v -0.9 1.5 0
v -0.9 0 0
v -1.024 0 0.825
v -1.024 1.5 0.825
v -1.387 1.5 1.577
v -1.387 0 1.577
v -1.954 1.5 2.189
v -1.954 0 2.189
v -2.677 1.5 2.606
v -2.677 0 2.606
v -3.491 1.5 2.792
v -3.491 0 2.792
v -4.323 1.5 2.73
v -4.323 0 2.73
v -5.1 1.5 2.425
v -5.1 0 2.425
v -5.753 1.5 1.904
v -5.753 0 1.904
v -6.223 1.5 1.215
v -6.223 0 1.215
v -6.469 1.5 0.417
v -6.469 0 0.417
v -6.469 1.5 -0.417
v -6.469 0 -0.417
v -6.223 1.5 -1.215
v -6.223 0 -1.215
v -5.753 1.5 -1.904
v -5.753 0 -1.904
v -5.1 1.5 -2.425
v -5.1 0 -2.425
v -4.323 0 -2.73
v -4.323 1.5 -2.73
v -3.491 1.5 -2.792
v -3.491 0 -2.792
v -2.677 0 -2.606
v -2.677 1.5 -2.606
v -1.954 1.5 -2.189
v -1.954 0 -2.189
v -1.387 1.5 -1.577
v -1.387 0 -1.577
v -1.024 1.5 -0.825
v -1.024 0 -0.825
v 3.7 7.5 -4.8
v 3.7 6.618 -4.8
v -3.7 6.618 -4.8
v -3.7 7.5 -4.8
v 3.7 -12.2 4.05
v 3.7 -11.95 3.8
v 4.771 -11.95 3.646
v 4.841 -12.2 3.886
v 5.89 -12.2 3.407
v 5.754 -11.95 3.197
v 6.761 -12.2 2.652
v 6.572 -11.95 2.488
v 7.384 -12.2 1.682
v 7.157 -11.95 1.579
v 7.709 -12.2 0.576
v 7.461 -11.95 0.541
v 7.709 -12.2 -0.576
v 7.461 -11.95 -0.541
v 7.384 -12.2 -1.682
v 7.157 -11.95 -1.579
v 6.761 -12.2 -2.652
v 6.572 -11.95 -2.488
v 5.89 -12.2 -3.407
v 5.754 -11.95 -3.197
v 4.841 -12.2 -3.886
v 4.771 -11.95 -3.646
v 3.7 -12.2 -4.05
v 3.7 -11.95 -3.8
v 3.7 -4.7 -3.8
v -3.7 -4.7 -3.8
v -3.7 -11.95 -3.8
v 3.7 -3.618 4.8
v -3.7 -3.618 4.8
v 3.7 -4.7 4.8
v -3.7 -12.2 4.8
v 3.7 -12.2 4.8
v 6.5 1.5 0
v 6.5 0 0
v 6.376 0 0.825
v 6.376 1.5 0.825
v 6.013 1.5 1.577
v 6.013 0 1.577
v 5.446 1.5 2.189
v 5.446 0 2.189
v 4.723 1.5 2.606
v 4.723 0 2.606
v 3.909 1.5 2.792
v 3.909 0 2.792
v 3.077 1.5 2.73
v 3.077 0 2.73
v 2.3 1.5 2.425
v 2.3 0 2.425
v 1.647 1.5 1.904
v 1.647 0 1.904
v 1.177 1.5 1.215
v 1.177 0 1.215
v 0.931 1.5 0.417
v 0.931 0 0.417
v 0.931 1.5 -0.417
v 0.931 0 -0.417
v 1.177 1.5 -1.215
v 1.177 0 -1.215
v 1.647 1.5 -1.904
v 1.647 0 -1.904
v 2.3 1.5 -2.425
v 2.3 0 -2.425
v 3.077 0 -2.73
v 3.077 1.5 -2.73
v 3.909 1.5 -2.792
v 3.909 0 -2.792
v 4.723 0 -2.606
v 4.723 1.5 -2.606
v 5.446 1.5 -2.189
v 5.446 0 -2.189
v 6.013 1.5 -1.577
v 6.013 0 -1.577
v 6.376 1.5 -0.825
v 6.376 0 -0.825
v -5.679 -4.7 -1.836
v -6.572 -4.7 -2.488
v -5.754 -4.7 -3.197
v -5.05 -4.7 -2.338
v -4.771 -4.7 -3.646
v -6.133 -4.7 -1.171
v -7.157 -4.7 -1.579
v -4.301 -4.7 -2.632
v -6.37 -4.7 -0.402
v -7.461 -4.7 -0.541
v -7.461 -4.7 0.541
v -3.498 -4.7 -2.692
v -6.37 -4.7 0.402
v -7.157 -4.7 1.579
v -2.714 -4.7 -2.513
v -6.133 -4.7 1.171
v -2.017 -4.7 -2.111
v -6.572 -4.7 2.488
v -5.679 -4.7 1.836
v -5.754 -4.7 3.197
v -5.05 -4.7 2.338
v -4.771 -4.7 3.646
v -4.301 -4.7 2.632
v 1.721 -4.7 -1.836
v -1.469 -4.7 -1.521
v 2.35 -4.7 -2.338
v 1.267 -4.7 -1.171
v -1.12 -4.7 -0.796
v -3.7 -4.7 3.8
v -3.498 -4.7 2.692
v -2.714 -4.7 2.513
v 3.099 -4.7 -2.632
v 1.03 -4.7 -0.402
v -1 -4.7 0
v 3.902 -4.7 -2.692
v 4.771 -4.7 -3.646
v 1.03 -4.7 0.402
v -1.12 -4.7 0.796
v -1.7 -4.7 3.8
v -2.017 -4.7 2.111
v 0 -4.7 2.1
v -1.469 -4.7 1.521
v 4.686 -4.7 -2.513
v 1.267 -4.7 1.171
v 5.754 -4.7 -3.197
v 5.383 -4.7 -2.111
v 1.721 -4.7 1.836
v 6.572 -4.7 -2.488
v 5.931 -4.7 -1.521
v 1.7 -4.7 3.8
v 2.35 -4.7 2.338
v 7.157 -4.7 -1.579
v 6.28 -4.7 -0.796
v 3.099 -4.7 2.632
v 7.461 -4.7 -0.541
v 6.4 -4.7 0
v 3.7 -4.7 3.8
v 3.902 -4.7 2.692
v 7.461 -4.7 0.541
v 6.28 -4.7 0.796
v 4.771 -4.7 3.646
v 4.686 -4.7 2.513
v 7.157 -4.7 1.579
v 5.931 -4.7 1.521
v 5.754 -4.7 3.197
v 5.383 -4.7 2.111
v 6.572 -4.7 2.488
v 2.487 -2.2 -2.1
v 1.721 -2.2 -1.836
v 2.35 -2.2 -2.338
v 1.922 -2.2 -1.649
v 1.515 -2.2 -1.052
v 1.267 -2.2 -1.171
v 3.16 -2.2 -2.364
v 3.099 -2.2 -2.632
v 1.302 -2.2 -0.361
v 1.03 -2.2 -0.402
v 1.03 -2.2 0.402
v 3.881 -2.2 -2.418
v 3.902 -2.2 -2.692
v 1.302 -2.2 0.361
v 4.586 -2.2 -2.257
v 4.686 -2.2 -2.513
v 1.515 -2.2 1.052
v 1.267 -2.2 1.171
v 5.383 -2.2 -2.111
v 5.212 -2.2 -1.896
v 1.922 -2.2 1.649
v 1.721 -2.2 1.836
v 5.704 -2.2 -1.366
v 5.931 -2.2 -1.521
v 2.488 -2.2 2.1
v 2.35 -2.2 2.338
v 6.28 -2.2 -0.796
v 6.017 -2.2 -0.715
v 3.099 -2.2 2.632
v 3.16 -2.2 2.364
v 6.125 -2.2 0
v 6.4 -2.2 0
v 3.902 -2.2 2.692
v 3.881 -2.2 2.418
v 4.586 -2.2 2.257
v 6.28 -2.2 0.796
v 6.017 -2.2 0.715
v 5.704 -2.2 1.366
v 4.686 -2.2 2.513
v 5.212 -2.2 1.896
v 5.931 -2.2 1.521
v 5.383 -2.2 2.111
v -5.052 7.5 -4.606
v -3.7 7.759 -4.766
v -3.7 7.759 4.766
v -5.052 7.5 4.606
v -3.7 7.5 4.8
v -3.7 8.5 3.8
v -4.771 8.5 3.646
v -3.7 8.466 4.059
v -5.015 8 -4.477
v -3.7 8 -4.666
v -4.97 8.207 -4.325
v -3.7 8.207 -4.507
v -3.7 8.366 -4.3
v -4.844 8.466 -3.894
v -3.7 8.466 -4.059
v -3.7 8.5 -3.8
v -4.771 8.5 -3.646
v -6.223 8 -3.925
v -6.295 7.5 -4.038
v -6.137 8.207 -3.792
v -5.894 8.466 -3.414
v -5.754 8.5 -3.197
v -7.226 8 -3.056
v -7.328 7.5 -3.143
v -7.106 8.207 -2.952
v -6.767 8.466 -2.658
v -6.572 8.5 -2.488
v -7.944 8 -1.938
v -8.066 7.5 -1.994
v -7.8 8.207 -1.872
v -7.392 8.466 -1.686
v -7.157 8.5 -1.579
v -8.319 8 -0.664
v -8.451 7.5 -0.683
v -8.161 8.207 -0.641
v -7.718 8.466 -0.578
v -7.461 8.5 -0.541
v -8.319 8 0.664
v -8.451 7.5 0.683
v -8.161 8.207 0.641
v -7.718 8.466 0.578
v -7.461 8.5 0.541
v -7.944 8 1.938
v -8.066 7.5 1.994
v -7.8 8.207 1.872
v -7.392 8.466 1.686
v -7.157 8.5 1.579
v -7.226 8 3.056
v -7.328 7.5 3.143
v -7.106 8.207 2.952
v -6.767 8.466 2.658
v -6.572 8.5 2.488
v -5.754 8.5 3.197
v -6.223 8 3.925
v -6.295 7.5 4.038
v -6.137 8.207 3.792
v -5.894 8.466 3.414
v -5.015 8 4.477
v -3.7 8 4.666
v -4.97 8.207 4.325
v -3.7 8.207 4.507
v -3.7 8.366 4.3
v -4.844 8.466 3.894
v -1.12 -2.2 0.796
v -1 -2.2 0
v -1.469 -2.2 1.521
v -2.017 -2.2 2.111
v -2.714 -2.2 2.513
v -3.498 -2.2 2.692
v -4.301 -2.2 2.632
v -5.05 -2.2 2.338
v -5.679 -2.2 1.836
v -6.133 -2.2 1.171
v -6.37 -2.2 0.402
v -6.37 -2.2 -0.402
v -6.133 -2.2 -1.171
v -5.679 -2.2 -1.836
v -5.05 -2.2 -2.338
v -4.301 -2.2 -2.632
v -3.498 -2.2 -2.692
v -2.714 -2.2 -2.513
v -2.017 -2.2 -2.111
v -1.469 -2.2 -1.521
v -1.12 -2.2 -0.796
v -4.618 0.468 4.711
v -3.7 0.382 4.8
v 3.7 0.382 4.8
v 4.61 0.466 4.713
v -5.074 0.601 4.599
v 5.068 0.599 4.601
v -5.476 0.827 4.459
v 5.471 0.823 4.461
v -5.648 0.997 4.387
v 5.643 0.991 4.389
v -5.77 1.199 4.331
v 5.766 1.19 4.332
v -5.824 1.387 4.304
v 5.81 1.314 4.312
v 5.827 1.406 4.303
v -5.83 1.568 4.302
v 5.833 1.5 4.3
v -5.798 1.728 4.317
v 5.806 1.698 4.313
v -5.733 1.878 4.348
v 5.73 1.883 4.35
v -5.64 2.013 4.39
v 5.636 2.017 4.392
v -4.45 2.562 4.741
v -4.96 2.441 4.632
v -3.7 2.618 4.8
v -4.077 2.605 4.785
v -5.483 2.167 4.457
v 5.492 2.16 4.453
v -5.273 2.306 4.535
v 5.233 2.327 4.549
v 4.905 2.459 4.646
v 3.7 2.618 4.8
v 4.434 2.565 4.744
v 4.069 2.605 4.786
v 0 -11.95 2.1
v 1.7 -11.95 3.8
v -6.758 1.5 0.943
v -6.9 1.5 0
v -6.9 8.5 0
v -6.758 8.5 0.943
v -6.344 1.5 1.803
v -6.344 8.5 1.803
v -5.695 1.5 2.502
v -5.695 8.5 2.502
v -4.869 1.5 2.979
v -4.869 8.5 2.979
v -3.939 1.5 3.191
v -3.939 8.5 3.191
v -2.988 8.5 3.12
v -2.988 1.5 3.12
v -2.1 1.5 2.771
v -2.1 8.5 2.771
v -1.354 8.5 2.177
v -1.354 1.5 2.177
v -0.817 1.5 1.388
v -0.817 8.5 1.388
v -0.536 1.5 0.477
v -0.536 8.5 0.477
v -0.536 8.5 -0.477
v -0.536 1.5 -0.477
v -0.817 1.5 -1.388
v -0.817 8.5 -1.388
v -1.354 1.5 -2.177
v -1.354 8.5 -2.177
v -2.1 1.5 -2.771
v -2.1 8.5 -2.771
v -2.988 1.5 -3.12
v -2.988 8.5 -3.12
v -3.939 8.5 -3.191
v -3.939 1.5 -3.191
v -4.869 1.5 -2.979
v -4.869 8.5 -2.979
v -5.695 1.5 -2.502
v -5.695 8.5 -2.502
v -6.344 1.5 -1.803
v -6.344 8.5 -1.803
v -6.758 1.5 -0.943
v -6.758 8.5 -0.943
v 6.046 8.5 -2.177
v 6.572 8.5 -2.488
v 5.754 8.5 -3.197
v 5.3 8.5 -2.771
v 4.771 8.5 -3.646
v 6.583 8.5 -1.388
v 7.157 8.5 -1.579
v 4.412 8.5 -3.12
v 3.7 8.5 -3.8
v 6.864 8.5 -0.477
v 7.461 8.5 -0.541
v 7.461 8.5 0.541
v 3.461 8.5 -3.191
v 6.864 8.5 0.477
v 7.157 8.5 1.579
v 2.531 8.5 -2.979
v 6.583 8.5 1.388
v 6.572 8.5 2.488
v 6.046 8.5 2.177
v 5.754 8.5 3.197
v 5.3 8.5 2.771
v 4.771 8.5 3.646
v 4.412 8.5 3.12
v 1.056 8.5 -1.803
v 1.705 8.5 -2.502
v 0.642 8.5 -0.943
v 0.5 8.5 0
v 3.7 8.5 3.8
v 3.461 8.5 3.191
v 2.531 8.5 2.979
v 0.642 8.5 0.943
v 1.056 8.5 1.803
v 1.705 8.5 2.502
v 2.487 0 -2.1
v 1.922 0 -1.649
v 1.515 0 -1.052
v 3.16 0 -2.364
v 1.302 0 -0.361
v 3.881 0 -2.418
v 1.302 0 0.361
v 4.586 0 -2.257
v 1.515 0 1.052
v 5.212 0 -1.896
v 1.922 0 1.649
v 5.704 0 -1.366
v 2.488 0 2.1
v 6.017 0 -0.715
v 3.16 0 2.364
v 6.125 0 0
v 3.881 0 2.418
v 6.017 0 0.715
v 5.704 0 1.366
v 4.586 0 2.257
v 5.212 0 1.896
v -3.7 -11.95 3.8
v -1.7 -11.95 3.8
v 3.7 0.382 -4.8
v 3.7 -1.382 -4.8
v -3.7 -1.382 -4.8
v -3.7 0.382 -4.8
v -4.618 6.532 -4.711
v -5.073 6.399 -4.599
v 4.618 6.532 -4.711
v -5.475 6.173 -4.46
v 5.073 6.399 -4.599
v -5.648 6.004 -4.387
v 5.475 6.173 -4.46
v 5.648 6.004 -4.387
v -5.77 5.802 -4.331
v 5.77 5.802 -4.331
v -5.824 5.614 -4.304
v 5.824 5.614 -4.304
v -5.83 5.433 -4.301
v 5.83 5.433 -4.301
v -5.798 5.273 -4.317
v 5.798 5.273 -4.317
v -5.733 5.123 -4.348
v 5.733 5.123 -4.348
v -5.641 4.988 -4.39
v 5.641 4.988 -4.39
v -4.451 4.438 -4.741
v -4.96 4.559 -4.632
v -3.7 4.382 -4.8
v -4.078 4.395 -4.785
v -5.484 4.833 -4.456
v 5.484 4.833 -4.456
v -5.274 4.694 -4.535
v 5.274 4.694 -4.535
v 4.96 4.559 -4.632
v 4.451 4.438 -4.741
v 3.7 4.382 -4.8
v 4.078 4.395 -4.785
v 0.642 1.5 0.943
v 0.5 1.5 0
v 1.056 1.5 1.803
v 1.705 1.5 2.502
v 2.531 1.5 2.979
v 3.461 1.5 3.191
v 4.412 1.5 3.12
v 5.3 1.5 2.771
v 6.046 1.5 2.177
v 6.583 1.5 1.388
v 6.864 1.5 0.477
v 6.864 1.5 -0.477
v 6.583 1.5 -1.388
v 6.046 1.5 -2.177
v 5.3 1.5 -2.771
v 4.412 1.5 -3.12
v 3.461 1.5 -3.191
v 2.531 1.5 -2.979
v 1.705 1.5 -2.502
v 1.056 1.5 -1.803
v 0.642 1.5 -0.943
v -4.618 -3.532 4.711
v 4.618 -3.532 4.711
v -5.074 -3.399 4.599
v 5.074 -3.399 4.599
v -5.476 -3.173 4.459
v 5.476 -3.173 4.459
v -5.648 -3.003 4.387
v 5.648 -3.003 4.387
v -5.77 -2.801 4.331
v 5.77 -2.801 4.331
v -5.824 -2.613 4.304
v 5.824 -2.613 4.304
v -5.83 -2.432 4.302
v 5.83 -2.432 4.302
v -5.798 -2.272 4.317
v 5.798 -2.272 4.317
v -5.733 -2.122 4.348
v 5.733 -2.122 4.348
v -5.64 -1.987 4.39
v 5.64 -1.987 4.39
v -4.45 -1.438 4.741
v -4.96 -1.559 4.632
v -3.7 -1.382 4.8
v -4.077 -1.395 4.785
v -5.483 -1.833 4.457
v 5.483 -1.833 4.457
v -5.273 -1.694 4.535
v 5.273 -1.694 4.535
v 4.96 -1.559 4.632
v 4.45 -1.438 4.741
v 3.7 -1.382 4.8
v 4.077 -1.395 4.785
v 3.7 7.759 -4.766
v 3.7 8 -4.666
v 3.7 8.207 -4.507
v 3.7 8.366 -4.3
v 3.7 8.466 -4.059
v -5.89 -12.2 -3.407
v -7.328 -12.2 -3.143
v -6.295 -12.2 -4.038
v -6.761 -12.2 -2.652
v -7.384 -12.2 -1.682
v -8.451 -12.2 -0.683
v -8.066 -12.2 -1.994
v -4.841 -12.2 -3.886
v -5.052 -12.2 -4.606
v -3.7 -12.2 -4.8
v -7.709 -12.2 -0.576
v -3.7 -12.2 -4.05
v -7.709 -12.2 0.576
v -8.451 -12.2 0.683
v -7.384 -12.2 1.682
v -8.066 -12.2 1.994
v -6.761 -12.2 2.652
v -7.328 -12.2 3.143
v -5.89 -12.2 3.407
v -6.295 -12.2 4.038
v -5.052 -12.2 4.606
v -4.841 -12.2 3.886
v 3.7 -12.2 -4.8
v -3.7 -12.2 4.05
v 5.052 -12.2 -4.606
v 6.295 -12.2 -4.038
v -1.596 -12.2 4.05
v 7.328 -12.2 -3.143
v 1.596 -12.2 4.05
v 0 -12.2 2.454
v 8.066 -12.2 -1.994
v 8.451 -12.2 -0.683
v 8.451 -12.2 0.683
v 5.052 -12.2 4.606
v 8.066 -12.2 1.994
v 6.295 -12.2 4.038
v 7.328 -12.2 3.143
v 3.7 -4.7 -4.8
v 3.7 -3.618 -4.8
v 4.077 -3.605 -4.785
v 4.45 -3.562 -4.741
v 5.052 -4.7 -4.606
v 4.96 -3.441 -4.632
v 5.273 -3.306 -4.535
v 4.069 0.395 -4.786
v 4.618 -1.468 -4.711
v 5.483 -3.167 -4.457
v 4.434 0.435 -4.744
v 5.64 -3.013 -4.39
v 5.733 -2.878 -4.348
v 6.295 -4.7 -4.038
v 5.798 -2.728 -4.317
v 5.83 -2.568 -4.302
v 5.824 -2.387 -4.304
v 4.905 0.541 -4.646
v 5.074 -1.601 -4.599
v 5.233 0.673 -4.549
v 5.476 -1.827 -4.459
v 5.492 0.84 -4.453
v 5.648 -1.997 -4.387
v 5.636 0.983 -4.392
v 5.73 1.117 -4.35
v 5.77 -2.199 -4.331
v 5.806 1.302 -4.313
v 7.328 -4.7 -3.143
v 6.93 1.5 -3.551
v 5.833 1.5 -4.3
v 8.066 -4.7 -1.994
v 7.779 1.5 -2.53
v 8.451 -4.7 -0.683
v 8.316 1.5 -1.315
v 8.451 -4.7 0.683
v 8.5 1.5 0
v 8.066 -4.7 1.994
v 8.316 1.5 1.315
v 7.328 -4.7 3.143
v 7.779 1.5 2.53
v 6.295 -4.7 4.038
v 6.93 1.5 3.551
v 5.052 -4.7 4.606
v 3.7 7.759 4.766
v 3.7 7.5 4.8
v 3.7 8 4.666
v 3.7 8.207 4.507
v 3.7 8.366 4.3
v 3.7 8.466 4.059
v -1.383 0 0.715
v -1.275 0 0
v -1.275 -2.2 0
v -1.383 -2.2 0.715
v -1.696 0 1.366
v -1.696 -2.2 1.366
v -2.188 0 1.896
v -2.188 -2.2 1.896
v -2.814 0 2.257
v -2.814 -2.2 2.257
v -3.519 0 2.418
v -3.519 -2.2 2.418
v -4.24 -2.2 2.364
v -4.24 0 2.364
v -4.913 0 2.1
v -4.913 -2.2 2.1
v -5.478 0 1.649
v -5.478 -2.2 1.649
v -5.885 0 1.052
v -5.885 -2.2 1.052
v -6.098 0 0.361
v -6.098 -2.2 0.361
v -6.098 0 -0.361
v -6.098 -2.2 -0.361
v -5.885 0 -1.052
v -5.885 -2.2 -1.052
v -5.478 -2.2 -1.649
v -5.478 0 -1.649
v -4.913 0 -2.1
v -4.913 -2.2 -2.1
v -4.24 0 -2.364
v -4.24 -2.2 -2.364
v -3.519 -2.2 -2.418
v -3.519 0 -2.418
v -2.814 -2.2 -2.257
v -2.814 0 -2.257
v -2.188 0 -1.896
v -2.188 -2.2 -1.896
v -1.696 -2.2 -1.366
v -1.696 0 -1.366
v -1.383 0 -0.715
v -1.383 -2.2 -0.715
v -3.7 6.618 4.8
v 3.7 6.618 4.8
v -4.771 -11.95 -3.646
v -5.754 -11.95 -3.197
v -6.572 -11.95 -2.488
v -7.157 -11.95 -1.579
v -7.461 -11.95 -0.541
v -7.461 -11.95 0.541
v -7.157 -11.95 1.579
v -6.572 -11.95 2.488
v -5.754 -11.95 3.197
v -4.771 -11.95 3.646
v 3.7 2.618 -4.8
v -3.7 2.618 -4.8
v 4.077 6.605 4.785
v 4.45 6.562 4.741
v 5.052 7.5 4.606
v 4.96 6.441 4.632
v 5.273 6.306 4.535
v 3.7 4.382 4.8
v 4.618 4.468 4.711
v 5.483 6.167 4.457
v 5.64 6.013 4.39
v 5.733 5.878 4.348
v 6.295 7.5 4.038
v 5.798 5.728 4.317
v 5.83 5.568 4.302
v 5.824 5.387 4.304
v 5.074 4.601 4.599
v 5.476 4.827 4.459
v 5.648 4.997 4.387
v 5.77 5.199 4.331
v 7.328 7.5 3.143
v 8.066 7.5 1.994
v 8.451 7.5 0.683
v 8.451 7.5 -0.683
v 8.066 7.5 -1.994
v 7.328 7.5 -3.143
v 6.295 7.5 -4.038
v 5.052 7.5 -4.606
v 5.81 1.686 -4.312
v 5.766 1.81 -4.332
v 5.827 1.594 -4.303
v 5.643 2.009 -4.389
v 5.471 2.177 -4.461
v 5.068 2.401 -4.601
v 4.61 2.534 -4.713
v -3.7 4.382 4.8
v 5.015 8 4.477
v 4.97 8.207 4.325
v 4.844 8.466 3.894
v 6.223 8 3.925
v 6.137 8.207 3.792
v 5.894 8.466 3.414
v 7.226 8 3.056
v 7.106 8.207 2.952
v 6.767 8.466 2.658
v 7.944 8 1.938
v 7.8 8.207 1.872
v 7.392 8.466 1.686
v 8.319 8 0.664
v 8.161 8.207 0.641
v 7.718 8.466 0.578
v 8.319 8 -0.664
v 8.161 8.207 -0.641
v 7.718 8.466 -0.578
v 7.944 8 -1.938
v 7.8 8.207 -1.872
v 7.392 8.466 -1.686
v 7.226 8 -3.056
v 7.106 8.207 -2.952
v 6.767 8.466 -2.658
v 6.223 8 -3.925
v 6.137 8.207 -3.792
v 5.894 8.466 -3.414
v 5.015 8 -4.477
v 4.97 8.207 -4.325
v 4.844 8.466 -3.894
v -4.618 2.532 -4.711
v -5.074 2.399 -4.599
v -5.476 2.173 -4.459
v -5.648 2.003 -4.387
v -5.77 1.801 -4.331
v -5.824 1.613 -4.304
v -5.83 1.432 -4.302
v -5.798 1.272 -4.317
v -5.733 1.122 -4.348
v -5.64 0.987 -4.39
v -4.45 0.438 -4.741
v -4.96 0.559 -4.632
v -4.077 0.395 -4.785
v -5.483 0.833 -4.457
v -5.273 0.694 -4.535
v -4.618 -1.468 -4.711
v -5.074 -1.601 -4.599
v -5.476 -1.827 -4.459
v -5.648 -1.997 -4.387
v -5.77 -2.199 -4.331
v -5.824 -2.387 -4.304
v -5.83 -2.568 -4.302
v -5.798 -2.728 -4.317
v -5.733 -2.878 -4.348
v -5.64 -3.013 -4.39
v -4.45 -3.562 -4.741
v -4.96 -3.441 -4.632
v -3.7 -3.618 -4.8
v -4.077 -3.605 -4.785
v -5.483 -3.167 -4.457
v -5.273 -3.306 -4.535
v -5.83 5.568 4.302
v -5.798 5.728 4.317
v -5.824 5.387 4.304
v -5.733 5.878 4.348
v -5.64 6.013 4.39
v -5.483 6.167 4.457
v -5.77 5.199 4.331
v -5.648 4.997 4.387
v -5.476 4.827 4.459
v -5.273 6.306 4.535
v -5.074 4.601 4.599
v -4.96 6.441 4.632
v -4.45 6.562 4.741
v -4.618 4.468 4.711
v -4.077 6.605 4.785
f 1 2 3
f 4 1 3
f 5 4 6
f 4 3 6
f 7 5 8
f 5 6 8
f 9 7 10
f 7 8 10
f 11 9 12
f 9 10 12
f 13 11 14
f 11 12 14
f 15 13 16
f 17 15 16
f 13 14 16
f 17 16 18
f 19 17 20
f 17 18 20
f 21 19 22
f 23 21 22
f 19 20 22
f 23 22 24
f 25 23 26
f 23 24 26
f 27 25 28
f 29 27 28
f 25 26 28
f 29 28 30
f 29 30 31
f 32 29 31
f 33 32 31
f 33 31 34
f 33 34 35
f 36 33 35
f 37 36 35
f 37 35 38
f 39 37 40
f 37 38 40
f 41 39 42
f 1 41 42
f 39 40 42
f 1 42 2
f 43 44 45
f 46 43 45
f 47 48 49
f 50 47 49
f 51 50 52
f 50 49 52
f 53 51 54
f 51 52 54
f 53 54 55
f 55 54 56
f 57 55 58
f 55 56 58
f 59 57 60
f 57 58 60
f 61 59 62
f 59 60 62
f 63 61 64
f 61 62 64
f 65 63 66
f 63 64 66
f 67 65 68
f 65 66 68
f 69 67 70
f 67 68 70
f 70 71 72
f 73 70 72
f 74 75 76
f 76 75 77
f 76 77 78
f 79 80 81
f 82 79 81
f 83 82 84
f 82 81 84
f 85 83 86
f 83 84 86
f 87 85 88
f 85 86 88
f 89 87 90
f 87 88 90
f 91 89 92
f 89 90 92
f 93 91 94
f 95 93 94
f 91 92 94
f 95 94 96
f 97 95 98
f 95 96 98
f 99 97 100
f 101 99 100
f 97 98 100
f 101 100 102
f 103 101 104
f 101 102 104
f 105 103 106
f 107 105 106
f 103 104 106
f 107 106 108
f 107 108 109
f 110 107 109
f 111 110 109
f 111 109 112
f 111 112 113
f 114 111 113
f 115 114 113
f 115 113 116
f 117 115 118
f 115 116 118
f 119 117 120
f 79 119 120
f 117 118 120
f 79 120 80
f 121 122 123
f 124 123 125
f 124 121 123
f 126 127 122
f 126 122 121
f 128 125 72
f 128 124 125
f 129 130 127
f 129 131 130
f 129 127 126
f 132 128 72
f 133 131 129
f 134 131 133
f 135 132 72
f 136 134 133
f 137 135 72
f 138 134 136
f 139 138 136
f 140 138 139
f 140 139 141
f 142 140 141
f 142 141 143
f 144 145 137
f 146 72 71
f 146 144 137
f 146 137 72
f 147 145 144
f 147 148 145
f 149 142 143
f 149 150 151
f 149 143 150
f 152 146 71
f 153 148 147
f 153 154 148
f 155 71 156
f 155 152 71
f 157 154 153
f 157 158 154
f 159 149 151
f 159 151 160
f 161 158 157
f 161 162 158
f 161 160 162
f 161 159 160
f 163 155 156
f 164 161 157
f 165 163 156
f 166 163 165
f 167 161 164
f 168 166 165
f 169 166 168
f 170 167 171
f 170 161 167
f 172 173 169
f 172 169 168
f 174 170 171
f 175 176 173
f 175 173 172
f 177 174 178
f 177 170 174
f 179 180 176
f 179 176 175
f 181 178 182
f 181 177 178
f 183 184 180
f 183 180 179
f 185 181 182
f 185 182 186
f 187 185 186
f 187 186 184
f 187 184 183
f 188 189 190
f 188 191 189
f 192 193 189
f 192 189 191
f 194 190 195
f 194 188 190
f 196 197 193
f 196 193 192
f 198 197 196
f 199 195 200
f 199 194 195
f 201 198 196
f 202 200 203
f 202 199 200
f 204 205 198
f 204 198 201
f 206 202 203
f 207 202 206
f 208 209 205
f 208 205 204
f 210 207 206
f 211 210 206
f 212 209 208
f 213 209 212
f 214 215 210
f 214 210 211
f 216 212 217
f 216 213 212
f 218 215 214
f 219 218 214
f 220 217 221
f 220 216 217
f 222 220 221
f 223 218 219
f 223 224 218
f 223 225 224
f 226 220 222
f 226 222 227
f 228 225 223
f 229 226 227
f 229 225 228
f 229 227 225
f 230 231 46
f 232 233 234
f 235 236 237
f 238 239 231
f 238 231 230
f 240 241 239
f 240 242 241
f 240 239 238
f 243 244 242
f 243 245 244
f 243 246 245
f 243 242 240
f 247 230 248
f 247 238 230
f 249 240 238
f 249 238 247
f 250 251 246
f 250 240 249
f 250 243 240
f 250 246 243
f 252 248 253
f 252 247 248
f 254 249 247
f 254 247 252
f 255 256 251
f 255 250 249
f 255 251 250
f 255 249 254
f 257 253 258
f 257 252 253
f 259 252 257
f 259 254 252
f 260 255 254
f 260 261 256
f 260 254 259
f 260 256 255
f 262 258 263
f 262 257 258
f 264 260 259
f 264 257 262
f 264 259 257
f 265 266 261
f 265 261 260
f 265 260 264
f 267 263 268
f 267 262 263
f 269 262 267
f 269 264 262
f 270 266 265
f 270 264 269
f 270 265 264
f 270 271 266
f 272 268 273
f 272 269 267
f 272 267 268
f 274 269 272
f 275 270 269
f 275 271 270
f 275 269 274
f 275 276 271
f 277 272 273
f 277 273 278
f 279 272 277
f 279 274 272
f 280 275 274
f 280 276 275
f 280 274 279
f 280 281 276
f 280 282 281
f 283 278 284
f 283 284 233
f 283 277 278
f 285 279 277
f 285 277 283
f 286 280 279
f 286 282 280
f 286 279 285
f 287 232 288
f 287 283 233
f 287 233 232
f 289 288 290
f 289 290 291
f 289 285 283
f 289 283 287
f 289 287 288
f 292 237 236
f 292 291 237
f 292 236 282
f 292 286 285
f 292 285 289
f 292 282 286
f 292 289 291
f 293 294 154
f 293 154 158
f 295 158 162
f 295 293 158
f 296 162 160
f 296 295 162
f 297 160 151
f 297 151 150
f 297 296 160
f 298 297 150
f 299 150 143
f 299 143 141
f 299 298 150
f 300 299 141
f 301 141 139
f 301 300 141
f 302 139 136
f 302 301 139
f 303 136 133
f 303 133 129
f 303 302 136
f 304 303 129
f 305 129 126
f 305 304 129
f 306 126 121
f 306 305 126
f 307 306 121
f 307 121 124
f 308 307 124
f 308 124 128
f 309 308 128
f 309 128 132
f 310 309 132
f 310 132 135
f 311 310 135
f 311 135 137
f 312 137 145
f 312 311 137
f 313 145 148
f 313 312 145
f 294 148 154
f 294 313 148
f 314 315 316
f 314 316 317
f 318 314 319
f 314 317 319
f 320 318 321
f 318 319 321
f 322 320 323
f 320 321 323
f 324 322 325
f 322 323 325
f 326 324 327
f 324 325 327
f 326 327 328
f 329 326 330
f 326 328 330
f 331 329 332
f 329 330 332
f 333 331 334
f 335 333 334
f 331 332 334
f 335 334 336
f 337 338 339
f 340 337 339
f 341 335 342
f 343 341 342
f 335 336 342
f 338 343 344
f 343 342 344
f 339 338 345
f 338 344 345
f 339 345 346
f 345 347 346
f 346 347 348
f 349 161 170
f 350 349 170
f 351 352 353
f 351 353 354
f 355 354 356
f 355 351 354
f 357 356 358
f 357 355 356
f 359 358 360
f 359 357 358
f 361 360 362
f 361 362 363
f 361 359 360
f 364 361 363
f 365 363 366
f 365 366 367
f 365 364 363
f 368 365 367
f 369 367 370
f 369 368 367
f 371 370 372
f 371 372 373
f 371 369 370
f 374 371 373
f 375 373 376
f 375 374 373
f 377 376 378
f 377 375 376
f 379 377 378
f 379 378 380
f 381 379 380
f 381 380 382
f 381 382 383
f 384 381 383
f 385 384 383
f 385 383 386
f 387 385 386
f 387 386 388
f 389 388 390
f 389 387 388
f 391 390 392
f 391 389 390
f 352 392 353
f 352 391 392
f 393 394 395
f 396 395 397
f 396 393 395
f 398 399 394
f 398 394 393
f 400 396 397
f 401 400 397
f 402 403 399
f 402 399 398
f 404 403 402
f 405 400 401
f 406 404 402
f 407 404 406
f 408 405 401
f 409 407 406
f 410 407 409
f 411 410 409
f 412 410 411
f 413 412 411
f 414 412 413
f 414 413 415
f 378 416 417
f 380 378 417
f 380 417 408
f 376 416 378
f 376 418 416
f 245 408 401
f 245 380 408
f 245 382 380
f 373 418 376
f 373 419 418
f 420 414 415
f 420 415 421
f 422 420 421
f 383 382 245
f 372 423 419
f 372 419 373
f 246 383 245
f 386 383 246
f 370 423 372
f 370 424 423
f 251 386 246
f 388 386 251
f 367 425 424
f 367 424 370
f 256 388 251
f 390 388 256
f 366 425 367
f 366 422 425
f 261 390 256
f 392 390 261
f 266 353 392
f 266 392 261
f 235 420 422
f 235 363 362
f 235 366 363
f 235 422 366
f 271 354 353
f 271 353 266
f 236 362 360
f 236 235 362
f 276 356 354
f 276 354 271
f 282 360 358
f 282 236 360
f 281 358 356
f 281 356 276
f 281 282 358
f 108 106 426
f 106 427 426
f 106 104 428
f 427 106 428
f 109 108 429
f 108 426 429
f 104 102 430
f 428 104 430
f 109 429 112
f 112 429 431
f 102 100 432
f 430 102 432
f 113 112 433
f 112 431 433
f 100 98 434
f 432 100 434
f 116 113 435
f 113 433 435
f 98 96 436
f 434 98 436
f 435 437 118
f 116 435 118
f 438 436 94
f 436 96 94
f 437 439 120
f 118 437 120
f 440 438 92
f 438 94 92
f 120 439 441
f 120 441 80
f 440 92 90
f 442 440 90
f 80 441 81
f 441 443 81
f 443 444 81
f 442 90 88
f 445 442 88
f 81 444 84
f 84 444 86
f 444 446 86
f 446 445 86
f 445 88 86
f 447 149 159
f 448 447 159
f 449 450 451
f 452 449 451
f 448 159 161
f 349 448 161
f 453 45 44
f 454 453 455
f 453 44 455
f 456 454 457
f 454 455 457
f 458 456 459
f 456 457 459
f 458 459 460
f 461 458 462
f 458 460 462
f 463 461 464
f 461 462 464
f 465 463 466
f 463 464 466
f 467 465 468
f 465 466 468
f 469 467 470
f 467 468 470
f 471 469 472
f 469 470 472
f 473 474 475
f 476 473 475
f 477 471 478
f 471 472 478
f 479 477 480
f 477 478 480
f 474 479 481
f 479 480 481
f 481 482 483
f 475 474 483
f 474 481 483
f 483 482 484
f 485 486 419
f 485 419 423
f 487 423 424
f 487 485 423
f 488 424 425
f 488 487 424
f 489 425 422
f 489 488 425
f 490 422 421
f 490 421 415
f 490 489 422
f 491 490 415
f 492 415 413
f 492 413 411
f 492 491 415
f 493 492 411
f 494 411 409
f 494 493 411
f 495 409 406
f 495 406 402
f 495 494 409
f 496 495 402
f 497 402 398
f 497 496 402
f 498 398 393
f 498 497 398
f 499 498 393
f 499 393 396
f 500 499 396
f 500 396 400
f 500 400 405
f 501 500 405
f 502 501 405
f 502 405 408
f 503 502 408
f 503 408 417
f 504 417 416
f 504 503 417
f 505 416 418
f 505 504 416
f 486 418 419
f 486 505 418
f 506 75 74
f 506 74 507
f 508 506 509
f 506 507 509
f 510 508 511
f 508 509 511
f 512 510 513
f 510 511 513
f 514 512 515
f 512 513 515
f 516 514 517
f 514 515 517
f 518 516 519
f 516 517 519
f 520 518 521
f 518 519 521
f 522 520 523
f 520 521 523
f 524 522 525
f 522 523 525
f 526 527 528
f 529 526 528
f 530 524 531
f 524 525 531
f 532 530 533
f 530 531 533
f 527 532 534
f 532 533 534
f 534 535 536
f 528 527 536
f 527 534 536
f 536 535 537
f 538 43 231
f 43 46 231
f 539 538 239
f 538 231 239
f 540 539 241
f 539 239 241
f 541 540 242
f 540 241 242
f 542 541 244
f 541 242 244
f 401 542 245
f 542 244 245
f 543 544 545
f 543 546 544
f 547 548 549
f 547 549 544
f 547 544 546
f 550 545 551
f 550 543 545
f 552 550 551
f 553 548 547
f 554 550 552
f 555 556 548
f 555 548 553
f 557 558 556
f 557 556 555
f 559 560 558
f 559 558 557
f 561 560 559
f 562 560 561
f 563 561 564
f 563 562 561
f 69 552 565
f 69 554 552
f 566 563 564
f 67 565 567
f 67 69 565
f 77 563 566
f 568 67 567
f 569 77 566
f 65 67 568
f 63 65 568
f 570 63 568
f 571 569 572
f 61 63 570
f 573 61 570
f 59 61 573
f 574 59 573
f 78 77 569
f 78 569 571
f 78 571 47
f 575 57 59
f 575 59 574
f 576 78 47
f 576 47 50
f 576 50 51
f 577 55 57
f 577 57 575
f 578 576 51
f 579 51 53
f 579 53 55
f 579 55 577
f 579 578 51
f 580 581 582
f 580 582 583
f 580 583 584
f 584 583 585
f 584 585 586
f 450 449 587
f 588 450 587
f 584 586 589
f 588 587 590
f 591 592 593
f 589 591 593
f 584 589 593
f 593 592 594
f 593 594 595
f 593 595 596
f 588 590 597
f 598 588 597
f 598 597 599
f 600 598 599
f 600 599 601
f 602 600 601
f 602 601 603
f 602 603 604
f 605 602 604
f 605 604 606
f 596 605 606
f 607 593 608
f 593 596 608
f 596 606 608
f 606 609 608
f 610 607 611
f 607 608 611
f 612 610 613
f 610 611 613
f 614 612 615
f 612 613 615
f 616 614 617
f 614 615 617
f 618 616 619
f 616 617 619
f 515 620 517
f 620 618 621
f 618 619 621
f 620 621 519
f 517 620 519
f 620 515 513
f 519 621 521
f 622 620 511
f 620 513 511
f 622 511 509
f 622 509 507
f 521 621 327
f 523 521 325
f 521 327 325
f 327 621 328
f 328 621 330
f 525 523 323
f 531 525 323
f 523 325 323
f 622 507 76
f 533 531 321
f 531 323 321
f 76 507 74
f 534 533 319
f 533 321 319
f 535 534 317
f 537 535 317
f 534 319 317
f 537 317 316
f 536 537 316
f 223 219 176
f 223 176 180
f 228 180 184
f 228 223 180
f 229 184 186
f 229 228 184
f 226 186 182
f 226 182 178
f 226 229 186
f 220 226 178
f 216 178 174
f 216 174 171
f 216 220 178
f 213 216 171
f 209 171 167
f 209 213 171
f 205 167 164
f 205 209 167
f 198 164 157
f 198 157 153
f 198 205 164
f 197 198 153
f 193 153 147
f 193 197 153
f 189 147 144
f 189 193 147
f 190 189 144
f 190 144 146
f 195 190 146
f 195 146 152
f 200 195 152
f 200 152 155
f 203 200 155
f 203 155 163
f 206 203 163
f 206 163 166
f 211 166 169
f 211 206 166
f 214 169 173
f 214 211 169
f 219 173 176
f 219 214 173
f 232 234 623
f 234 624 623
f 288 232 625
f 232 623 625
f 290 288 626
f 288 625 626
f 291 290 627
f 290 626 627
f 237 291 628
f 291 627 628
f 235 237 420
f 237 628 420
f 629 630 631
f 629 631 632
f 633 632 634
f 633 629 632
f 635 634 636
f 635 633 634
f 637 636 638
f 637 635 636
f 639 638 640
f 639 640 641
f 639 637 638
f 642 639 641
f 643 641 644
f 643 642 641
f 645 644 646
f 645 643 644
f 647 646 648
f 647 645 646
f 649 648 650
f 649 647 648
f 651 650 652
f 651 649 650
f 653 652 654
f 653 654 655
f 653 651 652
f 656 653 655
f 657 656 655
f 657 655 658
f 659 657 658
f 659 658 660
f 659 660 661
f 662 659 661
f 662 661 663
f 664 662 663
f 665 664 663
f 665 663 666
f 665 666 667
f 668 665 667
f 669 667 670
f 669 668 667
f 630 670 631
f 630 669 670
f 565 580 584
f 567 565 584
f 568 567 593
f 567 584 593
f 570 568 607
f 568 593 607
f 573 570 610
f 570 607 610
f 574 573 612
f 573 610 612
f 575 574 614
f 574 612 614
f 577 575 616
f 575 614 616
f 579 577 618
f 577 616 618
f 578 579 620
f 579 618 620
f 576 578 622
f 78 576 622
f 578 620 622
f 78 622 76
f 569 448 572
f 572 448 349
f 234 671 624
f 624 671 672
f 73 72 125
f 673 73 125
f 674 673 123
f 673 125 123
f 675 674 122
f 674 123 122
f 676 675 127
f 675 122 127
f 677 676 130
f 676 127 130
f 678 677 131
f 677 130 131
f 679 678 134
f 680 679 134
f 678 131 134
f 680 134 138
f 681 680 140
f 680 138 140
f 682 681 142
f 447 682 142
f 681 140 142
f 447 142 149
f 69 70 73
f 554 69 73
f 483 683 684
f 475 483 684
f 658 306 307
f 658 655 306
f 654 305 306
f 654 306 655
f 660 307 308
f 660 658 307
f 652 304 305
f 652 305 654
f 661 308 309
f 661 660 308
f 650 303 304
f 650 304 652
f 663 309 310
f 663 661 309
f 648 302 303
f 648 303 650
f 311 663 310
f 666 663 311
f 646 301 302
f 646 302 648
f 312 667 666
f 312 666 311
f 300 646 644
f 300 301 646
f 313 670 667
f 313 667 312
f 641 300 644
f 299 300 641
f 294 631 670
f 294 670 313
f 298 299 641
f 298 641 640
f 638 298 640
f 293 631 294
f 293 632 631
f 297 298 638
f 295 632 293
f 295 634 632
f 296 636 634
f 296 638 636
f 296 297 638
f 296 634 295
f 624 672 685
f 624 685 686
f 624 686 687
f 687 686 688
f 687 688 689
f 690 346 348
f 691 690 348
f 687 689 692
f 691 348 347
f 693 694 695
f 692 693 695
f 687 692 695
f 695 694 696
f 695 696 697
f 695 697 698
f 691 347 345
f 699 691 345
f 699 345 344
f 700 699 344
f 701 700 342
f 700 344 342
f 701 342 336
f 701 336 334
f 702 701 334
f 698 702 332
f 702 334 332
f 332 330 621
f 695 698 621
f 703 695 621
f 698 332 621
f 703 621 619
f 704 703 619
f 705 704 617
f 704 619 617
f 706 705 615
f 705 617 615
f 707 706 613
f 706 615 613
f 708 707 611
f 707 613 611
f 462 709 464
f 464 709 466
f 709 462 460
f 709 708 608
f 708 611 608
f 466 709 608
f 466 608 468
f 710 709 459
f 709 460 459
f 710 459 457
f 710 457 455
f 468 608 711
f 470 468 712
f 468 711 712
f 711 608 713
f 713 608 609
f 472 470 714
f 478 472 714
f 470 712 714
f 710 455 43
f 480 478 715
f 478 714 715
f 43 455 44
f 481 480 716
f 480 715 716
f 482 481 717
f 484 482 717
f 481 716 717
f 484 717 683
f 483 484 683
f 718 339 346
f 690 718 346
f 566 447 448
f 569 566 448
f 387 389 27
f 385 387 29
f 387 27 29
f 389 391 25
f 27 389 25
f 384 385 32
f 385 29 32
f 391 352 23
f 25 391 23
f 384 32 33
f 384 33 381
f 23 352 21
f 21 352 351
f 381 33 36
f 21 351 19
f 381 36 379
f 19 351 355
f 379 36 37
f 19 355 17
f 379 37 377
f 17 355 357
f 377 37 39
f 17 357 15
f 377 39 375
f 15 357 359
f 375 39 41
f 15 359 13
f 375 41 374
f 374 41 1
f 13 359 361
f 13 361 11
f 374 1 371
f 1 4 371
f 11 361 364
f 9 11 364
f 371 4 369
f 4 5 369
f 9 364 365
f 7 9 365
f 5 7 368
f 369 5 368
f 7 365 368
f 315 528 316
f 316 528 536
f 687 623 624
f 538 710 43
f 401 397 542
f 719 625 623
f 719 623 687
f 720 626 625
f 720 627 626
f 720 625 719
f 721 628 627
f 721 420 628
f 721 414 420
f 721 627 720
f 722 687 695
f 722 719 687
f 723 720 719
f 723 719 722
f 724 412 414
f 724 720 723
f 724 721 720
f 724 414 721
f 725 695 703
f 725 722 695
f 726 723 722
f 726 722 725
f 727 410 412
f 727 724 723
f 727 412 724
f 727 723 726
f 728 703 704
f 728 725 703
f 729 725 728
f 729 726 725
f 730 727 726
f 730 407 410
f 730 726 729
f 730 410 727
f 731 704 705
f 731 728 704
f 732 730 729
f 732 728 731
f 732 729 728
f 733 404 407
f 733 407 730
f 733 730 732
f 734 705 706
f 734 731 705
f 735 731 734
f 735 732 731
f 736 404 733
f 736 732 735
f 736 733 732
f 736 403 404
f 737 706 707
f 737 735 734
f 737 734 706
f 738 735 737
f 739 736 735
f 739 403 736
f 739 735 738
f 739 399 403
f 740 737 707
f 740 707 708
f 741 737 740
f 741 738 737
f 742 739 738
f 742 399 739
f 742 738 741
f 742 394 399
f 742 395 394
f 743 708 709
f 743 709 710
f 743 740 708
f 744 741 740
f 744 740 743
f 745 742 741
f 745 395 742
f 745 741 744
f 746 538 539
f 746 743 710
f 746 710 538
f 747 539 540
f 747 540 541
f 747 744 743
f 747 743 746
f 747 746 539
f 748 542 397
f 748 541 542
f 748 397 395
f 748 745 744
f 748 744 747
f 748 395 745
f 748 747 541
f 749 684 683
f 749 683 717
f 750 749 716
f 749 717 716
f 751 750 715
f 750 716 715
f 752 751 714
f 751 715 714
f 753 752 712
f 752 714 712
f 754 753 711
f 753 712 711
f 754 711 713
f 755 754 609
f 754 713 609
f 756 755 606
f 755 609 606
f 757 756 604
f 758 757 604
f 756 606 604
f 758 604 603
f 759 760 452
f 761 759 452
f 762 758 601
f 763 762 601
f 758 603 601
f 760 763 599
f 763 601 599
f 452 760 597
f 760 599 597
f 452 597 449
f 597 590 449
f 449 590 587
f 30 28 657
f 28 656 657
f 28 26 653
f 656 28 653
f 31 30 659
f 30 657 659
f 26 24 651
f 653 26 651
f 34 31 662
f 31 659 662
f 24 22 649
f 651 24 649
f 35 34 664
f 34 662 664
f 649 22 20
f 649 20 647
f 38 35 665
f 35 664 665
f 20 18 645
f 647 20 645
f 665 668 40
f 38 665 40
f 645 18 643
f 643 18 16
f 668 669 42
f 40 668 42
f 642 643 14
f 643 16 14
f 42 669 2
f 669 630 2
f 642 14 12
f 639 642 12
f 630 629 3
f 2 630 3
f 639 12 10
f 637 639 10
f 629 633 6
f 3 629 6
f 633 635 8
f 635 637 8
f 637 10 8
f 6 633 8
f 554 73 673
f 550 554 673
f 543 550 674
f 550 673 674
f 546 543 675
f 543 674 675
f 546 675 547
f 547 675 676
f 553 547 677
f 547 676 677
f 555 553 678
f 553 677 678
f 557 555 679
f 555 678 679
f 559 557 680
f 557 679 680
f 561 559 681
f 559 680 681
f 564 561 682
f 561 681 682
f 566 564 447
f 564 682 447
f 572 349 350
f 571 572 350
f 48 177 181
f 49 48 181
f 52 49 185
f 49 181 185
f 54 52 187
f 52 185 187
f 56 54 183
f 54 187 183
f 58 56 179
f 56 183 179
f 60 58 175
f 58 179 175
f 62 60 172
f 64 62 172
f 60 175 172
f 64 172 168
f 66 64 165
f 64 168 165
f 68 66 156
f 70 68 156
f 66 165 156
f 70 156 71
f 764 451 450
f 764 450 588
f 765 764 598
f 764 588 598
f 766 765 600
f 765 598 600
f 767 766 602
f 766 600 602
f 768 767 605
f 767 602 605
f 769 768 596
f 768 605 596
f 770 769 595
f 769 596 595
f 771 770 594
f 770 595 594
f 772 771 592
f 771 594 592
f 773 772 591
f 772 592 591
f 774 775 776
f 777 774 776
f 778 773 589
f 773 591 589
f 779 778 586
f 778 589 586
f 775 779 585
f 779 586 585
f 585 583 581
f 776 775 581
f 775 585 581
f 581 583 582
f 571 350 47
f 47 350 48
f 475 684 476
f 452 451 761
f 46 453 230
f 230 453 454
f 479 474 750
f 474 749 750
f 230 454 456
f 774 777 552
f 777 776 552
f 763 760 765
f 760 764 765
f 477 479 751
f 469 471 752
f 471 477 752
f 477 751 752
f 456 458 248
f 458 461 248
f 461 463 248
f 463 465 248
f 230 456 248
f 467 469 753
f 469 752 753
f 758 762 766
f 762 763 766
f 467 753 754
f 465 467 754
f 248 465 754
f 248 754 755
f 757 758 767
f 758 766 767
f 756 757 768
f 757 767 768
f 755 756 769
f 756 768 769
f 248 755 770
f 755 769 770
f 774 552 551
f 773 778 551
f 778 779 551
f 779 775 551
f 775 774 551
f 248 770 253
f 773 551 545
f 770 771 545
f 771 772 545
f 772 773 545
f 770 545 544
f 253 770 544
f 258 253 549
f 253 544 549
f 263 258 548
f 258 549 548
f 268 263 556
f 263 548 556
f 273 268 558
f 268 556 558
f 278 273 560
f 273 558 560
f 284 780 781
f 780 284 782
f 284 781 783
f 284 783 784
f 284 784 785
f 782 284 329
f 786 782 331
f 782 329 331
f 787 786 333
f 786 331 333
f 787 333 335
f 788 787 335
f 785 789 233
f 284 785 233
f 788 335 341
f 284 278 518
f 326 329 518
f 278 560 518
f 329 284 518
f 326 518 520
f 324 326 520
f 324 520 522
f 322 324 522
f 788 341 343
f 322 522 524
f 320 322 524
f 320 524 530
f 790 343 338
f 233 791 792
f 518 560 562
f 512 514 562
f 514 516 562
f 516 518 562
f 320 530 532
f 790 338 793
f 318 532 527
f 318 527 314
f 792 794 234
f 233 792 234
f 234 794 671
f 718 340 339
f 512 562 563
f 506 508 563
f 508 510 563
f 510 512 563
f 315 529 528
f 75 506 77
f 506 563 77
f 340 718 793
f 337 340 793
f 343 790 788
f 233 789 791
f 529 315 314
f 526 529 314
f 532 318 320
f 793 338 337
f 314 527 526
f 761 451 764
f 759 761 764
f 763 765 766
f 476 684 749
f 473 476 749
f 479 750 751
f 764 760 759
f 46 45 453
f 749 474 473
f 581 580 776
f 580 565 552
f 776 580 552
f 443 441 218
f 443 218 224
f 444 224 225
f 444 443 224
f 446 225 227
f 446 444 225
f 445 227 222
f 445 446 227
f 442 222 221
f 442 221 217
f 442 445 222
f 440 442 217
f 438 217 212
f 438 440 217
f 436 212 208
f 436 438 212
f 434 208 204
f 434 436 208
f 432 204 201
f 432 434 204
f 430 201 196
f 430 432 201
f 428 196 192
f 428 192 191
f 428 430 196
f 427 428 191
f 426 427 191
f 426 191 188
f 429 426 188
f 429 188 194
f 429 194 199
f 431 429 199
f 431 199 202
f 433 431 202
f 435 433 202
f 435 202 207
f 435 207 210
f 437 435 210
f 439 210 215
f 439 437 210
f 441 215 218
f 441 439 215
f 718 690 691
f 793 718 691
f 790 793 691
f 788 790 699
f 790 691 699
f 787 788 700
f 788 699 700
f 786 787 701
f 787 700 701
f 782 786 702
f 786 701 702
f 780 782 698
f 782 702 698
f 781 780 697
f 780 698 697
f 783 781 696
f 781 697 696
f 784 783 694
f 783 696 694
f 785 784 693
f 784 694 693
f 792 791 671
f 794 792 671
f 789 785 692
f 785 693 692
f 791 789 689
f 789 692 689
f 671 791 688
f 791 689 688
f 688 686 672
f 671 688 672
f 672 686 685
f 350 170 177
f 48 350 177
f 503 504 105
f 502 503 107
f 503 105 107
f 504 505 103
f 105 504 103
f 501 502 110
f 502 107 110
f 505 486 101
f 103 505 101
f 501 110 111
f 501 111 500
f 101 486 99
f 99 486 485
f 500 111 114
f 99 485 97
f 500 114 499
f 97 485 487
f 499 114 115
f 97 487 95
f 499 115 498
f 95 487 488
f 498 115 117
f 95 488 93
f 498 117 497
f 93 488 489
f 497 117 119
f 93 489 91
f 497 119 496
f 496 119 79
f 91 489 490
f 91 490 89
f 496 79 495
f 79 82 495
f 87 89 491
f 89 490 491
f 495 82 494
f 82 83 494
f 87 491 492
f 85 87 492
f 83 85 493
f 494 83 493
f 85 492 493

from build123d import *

# Parameters (mm, degrees)
F0_R      = 2.8
F1_DEPTH  = 1.5
F0_R_2    = 2.425
F2_DEPTH  = 2.2
F3_R      = 2.7
F4_DEPTH  = 2.5
F6_DEPTH  = 7.5
F7_R      = 3.2
F8_DEPTH  = 7
F9_R      = 1
F10_SIZE  = 0.25
F11_R     = 1.5
F12_DEPTH = 8.5


with BuildPart() as f1:
    # F0 (on Front) → F1 (new body)
    with BuildSketch(Plane.XZ):
        with BuildLine():
            Line((0, 4.8), (-3.7, 4.8))
            ThreePointArc((-3.7, 4.8), (-7.0941125497, 3.3941125497), (-8.5, 0))
            ThreePointArc((-8.5, 0), (-7.0941125497, -3.3941125497), (-3.7, -4.8))
            Line((-3.7, -4.8), (0, -4.8))
            Line((0, -4.8), (3.7, -4.8))
            ThreePointArc((3.7, -4.8), (7.0941125497, -3.3941125497), (8.5, 0))
            ThreePointArc((8.5, 0), (7.0941125497, 3.3941125497), (3.7, 4.8))
            Line((3.7, 4.8), (0, 4.8))
        make_face()
        with Locations((-3.7, 0)):
            Circle(F0_R, mode=Mode.SUBTRACT)
        with Locations((3.7, 0)):
            Circle(F0_R, mode=Mode.SUBTRACT)
    extrude(amount=-F1_DEPTH)

    # F0 (on Front) → F2 (join)
    with BuildSketch(Plane.XZ):
        with BuildLine():
            Line((0, 4.8), (-3.7, 4.8))
            ThreePointArc((-3.7, 4.8), (-7.0941125497, 3.3941125497), (-8.5, 0))
            ThreePointArc((-8.5, 0), (-7.0941125497, -3.3941125497), (-3.7, -4.8))
            Line((-3.7, -4.8), (0, -4.8))
            Line((0, -4.8), (3.7, -4.8))
            ThreePointArc((3.7, -4.8), (7.0941125497, -3.3941125497), (8.5, 0))
            ThreePointArc((8.5, 0), (7.0941125497, 3.3941125497), (3.7, 4.8))
            Line((3.7, 4.8), (0, 4.8))
        make_face()
        with Locations((-3.7, 0)):
            Circle(F0_R, mode=Mode.SUBTRACT)
        with Locations((3.7, 0)):
            Circle(F0_R, mode=Mode.SUBTRACT)
        with Locations((-3.7, 0)):
            Circle(F0_R)
        with Locations((-3.7, 0)):
            Circle(F0_R_2, mode=Mode.SUBTRACT)
        with Locations((3.7, 0)):
            Circle(F0_R)
        with Locations((3.7, 0)):
            Circle(F0_R_2, mode=Mode.SUBTRACT)
    extrude(amount=F2_DEPTH)

    # F3 (on face) → F4 (join)
    with BuildSketch(Plane.XZ.offset(2.2)):
        with BuildLine():
            ThreePointArc((3.7, -4.8), (8.5, 0), (3.7, 4.8))
            Line((3.7, 4.8), (-3.7, 4.8))
            ThreePointArc((-3.7, 4.8), (-8.5, 0), (-3.7, -4.8))
            Line((-3.7, -4.8), (3.7, -4.8))
        make_face()
        with Locations((-3.7, 0)):
            Circle(F3_R, mode=Mode.SUBTRACT)
        with Locations((3.7, 0)):
            Circle(F3_R, mode=Mode.SUBTRACT)
    extrude(amount=F4_DEPTH)

    # F5 (on face) → F6 (join)
    with BuildSketch(Plane.XZ.offset(4.7)):
        with BuildLine():
            ThreePointArc((-3.7, 4.8), (-8.5, 0), (-3.7, -4.8))
            Line((-3.7, -4.8), (3.7, -4.8))
            ThreePointArc((3.7, -4.8), (8.5, 0), (3.7, 4.8))
            Line((3.7, 4.8), (-3.7, 4.8))
        make_face()
        with BuildLine():
            Line((0, -3.8), (-3.7, -3.8))
            ThreePointArc((-3.7, -3.8), (-7.5, 0), (-3.7, 3.8))
            Line((-3.7, 3.8), (-1.7, 3.8))
            Line((-1.7, 3.8), (0, 2.1))
            Line((0, 2.1), (1.7, 3.8))
            Line((1.7, 3.8), (3.7, 3.8))
            ThreePointArc((3.7, 3.8), (7.5, 0), (3.7, -3.8))
            Line((3.7, -3.8), (0, -3.8))
        make_face(mode=Mode.SUBTRACT)
    extrude(amount=F6_DEPTH)

    # F7 (on face) → F8 (join)
    with BuildSketch(Plane(origin=(0, 1.5, 0), x_dir=(-1, 0, 0), z_dir=(0, 1, 0))):
        with BuildLine():
            ThreePointArc((3.7, -4.8), (8.5, 0), (3.7, 4.8))
            Line((3.7, 4.8), (-3.7, 4.8))
            ThreePointArc((-3.7, 4.8), (-8.5, 0), (-3.7, -4.8))
            Line((-3.7, -4.8), (3.7, -4.8))
        make_face()
        with Locations((-3.7, 0)):
            Circle(F7_R, mode=Mode.SUBTRACT)
        with Locations((3.7, 0)):
            Circle(F7_R, mode=Mode.SUBTRACT)
    extrude(amount=F8_DEPTH)

    # F9
    f9_edges = [f1.edges().sort_by_distance(p)[0] for p in [
        (0, 8.5, 4.8),
    ]]
    fillet(f9_edges, radius=F9_R)

    # F10
    f10_edges = [f1.edges().sort_by_distance(p)[0] for p in [
        (-7.5, -12.2, 0),
        (-2.7, -12.2, 3.8),
        (-0.85, -12.2, 2.95),
        (0.85, -12.2, 2.95),
        (2.7, -12.2, 3.8),
        (7.5, -12.2, 0),
        (0, -12.2, -3.8),
    ]]
    chamfer(f10_edges, length=F10_SIZE)

    # F11 (on Right) → F12 (cut, symmetric)
    with BuildSketch(Plane.YZ):
        with Locations((-2.5, 5.8)):
            Circle(F11_R)
        with Locations((1.5, 5.8)):
            Circle(F11_R)
        with Locations((5.5, 5.8)):
            Circle(F11_R)
        with Locations((-2.5, -5.8)):
            Circle(F11_R)
        with Locations((1.5, -5.8)):
            Circle(F11_R)
        with Locations((5.5, -5.8)):
            Circle(F11_R)
    extrude(amount=F12_DEPTH, both=True, mode=Mode.SUBTRACT)


solid = f1.part
